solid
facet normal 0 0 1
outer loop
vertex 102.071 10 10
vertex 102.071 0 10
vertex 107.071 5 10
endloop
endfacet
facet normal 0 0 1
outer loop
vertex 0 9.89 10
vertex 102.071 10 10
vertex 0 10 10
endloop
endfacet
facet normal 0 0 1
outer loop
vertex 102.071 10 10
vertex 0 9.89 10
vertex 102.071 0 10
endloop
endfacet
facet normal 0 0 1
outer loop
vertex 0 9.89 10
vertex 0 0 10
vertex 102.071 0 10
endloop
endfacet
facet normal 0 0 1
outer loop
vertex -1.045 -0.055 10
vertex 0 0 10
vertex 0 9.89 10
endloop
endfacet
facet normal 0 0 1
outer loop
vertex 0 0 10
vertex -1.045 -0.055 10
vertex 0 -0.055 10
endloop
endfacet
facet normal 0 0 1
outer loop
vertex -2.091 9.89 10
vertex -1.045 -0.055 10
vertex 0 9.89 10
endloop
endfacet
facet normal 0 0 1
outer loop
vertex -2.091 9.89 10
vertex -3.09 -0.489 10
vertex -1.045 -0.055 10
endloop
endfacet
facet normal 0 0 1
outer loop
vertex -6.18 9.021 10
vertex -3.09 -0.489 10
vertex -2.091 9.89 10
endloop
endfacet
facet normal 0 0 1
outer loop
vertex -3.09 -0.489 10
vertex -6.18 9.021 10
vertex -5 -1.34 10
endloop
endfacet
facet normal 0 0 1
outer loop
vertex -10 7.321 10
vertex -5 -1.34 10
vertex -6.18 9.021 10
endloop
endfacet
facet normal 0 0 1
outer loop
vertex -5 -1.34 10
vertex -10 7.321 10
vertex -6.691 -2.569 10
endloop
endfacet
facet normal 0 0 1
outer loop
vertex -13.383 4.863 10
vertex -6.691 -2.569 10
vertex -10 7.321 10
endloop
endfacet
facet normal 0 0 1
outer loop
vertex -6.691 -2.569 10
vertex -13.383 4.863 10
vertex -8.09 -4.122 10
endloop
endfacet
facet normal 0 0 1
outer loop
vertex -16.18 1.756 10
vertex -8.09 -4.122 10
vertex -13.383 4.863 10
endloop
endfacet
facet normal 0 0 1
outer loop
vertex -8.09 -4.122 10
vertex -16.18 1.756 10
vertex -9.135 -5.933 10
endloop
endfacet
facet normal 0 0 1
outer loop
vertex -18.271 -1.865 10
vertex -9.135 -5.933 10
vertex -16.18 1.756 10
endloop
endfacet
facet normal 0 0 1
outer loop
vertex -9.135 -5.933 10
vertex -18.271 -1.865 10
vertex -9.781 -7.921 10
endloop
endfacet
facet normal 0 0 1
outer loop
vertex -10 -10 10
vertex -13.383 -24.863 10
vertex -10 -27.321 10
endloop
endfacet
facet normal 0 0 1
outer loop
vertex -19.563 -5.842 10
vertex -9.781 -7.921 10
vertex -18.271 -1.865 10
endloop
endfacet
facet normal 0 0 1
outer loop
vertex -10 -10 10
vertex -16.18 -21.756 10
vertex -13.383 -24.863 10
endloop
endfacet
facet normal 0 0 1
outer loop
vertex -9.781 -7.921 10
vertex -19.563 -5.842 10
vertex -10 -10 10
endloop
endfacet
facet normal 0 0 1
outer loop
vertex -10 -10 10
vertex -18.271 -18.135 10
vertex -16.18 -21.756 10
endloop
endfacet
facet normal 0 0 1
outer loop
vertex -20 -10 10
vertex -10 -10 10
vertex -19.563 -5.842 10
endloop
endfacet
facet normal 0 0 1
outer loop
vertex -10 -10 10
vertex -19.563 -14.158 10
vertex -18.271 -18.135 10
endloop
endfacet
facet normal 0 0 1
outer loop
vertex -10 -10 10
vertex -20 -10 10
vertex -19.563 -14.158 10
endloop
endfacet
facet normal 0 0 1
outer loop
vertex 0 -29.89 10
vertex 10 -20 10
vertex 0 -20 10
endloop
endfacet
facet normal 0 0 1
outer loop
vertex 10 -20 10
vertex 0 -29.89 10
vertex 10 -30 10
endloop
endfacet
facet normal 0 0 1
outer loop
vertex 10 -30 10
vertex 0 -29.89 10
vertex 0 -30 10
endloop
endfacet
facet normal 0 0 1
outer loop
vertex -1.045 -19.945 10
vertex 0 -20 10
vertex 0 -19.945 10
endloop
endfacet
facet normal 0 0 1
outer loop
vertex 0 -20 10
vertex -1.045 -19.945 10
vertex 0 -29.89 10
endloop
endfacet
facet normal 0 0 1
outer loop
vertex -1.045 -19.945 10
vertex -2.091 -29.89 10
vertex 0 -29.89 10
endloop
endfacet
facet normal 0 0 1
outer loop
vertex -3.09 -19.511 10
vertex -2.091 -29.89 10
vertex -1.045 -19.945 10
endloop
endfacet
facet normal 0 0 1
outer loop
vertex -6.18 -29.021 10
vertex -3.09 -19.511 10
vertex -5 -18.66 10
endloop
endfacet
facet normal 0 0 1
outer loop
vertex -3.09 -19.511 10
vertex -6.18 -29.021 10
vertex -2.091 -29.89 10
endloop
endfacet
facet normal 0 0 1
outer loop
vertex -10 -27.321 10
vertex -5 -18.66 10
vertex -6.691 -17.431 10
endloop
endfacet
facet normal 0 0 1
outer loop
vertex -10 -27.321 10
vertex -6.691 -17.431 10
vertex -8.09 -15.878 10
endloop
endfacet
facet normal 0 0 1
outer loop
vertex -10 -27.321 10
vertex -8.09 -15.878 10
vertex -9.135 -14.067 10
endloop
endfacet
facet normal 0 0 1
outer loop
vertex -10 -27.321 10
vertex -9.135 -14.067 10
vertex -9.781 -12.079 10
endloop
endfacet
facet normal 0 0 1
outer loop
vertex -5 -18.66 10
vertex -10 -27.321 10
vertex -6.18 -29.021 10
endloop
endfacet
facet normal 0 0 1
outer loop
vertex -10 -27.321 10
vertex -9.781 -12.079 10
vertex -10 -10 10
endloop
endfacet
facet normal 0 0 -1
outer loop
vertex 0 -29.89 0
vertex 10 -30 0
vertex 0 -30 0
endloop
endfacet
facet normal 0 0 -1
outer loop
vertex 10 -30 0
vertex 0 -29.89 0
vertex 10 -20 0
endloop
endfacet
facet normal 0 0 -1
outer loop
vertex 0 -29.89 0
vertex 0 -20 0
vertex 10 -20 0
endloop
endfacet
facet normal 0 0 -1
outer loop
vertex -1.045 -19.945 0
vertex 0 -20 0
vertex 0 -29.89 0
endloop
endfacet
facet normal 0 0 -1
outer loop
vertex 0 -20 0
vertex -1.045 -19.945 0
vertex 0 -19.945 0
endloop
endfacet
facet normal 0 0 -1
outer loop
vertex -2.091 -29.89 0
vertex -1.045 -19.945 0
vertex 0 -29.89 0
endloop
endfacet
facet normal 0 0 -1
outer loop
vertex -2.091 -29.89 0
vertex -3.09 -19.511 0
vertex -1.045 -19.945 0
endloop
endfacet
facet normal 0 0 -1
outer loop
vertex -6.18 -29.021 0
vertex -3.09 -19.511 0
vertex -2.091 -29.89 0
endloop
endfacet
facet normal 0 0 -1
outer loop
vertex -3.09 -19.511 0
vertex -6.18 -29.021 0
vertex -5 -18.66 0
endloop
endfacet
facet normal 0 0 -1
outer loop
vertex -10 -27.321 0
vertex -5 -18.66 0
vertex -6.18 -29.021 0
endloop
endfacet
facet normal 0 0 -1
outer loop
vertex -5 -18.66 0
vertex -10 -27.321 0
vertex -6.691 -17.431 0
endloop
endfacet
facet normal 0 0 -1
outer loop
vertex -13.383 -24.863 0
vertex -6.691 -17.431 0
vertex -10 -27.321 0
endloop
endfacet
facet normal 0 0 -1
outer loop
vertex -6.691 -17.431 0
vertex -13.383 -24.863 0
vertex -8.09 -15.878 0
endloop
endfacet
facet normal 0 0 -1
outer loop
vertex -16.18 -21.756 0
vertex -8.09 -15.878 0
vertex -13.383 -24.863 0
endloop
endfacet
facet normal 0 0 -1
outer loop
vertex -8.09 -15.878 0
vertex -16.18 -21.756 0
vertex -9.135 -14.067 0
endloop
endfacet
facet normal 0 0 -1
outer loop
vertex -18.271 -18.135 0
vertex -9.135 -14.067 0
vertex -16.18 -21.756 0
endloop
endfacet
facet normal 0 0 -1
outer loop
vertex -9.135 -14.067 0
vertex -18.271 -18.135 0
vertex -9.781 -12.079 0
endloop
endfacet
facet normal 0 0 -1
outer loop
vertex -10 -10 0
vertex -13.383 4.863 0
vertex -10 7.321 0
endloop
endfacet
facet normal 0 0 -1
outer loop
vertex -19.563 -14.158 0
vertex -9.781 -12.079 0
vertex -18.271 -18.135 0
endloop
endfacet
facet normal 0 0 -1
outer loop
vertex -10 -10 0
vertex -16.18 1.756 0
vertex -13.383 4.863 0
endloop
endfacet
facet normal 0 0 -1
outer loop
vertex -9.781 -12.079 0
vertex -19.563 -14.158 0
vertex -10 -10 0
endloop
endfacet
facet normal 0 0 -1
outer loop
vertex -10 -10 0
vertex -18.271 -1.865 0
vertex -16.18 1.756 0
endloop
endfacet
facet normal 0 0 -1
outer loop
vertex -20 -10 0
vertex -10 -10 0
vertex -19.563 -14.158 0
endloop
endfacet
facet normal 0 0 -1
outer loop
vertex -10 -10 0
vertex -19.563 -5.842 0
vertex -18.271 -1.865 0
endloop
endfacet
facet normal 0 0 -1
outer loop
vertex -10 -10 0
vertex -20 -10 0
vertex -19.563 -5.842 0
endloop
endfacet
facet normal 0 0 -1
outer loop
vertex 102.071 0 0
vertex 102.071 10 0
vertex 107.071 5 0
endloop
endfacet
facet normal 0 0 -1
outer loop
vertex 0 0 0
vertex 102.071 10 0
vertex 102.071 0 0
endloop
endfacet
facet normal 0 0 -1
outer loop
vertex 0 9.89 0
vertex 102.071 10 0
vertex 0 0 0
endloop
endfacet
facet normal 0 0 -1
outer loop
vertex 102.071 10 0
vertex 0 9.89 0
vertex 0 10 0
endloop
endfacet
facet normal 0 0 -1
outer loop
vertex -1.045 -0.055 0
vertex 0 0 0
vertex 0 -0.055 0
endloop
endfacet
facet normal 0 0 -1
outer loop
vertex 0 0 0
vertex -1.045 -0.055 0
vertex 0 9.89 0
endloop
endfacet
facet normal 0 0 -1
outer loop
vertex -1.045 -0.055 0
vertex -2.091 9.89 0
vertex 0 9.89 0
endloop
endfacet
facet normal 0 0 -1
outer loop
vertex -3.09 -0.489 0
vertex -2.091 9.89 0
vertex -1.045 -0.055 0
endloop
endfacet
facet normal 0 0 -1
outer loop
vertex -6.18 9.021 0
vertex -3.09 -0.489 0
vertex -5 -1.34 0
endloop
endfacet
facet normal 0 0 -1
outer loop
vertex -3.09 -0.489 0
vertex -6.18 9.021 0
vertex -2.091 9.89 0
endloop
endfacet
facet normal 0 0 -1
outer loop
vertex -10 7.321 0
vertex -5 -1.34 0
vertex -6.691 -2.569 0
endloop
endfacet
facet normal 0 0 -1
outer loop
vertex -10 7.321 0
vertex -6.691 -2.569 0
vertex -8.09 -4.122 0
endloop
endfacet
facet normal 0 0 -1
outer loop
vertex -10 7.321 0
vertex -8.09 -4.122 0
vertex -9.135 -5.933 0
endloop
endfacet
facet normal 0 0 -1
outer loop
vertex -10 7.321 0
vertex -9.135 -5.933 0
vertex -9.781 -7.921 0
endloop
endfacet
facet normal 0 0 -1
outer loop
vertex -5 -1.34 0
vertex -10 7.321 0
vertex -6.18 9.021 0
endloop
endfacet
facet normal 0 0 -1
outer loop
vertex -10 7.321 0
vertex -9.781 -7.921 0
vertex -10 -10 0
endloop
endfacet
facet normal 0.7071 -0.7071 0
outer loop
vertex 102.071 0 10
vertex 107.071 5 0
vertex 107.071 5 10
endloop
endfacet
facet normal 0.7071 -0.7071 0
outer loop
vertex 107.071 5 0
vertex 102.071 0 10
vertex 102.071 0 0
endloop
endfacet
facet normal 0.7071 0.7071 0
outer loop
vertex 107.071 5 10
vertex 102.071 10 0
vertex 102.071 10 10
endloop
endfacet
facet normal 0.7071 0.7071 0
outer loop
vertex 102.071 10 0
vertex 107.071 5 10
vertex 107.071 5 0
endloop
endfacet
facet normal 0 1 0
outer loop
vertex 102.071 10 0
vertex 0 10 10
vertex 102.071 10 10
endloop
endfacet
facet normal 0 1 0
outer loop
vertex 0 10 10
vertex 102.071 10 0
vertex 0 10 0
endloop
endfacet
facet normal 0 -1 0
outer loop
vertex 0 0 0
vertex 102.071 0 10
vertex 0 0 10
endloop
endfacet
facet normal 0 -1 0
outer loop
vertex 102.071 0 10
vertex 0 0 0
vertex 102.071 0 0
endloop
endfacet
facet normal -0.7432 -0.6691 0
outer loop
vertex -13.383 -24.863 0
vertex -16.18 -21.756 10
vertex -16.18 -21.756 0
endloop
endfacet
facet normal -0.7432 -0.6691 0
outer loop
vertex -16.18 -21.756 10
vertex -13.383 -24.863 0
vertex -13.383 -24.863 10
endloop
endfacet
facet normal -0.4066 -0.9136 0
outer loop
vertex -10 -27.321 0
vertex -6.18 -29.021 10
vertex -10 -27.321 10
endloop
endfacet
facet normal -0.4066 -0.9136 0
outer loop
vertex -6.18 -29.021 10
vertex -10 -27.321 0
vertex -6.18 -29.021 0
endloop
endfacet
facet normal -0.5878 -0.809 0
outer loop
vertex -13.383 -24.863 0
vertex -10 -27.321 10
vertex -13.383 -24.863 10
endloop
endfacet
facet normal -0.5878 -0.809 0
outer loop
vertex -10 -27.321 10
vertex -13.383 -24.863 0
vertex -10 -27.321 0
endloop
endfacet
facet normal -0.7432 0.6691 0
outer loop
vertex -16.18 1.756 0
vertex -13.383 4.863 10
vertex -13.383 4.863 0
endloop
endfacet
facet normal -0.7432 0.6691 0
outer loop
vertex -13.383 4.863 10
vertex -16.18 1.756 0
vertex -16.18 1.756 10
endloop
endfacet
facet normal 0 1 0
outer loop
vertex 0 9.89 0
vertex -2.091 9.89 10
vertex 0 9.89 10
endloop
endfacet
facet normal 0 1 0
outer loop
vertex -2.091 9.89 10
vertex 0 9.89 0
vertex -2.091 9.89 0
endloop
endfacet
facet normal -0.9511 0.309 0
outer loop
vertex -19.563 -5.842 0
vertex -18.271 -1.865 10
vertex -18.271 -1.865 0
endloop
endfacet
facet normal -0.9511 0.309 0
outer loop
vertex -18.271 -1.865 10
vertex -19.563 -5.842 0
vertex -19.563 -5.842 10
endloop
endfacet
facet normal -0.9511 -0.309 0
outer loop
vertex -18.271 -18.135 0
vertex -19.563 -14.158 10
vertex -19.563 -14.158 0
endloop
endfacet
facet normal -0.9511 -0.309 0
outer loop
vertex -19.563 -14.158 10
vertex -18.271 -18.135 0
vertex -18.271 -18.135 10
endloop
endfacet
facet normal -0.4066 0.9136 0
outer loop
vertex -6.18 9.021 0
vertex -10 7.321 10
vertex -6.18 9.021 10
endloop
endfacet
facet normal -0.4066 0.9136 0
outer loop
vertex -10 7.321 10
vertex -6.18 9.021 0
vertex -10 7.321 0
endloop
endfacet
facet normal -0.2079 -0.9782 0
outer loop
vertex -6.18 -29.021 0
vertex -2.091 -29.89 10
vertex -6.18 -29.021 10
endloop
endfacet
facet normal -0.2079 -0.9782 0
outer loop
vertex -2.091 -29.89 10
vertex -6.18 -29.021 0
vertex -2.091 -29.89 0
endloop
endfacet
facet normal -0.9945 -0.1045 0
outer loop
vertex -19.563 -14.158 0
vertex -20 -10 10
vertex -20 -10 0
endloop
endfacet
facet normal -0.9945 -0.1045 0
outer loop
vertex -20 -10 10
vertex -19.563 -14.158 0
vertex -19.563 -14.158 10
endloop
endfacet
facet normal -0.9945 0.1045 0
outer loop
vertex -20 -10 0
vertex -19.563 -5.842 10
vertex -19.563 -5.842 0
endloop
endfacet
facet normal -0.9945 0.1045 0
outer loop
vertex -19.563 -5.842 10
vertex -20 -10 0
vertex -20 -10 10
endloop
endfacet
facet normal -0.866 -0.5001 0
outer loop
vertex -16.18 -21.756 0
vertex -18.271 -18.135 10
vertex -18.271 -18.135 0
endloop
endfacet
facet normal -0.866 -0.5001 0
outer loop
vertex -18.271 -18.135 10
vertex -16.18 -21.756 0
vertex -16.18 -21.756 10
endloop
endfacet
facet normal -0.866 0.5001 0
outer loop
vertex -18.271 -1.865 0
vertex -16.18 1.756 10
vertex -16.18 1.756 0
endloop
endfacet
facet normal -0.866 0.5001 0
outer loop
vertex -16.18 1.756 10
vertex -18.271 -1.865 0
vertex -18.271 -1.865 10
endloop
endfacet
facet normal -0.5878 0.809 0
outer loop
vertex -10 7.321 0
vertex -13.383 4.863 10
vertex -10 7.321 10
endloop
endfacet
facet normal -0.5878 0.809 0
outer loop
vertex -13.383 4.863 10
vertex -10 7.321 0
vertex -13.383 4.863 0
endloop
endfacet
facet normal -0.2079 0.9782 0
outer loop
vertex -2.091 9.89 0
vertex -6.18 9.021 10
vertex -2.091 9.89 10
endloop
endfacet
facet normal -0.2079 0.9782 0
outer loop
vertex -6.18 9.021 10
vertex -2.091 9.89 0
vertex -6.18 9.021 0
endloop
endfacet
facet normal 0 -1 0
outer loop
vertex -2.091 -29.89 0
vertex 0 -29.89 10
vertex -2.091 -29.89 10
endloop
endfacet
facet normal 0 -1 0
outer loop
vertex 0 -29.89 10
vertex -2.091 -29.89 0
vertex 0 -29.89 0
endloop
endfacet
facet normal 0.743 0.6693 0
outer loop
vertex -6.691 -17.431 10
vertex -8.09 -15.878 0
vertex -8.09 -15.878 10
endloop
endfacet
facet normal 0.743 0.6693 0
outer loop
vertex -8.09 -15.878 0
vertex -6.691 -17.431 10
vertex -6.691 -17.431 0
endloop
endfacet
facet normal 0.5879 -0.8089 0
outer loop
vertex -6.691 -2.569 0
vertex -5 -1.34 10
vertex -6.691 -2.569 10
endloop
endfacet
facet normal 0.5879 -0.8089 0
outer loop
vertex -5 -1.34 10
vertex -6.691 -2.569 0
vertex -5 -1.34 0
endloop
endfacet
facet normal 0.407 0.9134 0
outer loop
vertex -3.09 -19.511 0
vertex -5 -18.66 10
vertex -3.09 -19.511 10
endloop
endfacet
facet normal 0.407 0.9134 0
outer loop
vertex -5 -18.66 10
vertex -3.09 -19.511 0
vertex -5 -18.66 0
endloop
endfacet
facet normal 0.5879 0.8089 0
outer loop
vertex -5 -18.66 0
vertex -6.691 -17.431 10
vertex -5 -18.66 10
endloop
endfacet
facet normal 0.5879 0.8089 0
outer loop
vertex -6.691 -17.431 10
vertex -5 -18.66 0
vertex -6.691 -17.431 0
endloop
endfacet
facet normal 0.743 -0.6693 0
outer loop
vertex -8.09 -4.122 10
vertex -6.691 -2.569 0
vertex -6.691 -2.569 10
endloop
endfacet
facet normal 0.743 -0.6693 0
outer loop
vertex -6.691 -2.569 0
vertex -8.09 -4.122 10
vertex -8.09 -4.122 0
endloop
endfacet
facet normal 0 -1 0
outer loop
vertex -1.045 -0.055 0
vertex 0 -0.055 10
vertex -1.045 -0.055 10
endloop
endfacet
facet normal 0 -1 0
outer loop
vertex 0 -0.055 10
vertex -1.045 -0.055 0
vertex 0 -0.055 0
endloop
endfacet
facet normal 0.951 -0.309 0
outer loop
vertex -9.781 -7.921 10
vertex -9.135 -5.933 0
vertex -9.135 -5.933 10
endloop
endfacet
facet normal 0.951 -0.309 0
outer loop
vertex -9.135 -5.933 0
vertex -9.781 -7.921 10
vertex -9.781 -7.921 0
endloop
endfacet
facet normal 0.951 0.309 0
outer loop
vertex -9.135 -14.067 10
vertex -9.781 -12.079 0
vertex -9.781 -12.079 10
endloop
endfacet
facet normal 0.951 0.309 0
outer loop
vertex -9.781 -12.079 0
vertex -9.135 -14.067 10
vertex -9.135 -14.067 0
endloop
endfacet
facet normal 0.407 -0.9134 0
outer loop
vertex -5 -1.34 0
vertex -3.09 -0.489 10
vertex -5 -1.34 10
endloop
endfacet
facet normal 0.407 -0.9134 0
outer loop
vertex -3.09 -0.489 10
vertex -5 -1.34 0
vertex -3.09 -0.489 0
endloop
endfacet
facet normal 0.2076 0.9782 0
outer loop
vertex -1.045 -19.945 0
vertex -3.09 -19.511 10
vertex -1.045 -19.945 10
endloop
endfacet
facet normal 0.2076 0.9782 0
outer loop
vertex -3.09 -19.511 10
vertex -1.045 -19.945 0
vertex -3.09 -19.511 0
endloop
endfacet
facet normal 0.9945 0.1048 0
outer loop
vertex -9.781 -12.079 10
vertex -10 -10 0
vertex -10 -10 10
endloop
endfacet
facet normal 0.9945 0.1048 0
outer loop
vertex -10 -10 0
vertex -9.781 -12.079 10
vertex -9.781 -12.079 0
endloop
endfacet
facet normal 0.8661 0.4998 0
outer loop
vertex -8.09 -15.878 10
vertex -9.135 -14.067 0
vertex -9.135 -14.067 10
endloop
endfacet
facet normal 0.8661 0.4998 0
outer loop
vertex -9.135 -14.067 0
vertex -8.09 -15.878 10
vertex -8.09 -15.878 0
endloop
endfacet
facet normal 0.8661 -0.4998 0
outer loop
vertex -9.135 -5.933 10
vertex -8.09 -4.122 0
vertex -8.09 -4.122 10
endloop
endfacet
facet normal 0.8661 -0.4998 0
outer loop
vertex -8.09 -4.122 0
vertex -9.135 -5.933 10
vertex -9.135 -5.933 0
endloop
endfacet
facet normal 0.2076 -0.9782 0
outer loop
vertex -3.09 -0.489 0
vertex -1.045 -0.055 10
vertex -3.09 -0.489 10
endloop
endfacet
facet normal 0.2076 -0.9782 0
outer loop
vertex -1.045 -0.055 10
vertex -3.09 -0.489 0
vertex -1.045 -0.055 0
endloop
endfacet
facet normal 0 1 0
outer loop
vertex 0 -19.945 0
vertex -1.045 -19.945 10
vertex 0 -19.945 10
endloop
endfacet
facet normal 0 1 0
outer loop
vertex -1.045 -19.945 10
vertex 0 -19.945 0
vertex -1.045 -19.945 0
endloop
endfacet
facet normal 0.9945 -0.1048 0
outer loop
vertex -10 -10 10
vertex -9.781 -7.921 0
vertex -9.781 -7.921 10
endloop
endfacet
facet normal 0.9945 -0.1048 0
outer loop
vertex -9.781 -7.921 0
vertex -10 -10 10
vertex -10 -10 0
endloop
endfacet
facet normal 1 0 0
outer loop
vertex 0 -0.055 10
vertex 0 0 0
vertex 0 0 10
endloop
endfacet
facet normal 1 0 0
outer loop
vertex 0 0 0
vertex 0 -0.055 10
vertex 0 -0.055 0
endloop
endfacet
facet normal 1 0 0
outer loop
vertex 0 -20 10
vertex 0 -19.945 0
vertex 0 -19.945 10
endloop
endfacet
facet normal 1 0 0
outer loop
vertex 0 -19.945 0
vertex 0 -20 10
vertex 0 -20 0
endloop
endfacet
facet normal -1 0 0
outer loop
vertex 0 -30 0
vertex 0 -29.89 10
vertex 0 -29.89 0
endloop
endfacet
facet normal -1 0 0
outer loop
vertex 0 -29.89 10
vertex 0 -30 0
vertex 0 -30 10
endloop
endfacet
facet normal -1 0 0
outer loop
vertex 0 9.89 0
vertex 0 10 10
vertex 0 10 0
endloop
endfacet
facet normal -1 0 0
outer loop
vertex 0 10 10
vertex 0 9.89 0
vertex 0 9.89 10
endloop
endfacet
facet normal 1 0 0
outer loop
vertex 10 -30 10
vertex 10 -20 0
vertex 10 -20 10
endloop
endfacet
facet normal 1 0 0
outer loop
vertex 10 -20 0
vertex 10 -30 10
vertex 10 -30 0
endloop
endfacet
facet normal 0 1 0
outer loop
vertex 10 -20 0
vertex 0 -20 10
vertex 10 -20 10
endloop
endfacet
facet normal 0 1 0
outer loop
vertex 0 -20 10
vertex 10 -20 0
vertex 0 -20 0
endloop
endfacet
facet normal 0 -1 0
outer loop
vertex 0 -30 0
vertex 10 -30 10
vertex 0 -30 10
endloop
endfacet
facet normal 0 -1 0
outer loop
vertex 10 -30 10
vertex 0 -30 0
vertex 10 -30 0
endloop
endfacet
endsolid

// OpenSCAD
cube([100, 10, 10]);
intersection() {
  translate([100, (10 - sqrt(200)) / 2, 0]) {
    rotate([0, 0, 45]) color("purple") cube(10);
  }
  translate([100, 0, 0]) color("pink") cube([110, 10, 10]);
}
translate([0, -30, 0]) cube([10, 10, 10]);
translate([0, -10, 0]) difference () { 
    cylinder(10,20, 20);
    color("red")    cylinder(10,10, 10);
    color("blue") translate([0, -20, 0]) cube([20,30,10]);
}
